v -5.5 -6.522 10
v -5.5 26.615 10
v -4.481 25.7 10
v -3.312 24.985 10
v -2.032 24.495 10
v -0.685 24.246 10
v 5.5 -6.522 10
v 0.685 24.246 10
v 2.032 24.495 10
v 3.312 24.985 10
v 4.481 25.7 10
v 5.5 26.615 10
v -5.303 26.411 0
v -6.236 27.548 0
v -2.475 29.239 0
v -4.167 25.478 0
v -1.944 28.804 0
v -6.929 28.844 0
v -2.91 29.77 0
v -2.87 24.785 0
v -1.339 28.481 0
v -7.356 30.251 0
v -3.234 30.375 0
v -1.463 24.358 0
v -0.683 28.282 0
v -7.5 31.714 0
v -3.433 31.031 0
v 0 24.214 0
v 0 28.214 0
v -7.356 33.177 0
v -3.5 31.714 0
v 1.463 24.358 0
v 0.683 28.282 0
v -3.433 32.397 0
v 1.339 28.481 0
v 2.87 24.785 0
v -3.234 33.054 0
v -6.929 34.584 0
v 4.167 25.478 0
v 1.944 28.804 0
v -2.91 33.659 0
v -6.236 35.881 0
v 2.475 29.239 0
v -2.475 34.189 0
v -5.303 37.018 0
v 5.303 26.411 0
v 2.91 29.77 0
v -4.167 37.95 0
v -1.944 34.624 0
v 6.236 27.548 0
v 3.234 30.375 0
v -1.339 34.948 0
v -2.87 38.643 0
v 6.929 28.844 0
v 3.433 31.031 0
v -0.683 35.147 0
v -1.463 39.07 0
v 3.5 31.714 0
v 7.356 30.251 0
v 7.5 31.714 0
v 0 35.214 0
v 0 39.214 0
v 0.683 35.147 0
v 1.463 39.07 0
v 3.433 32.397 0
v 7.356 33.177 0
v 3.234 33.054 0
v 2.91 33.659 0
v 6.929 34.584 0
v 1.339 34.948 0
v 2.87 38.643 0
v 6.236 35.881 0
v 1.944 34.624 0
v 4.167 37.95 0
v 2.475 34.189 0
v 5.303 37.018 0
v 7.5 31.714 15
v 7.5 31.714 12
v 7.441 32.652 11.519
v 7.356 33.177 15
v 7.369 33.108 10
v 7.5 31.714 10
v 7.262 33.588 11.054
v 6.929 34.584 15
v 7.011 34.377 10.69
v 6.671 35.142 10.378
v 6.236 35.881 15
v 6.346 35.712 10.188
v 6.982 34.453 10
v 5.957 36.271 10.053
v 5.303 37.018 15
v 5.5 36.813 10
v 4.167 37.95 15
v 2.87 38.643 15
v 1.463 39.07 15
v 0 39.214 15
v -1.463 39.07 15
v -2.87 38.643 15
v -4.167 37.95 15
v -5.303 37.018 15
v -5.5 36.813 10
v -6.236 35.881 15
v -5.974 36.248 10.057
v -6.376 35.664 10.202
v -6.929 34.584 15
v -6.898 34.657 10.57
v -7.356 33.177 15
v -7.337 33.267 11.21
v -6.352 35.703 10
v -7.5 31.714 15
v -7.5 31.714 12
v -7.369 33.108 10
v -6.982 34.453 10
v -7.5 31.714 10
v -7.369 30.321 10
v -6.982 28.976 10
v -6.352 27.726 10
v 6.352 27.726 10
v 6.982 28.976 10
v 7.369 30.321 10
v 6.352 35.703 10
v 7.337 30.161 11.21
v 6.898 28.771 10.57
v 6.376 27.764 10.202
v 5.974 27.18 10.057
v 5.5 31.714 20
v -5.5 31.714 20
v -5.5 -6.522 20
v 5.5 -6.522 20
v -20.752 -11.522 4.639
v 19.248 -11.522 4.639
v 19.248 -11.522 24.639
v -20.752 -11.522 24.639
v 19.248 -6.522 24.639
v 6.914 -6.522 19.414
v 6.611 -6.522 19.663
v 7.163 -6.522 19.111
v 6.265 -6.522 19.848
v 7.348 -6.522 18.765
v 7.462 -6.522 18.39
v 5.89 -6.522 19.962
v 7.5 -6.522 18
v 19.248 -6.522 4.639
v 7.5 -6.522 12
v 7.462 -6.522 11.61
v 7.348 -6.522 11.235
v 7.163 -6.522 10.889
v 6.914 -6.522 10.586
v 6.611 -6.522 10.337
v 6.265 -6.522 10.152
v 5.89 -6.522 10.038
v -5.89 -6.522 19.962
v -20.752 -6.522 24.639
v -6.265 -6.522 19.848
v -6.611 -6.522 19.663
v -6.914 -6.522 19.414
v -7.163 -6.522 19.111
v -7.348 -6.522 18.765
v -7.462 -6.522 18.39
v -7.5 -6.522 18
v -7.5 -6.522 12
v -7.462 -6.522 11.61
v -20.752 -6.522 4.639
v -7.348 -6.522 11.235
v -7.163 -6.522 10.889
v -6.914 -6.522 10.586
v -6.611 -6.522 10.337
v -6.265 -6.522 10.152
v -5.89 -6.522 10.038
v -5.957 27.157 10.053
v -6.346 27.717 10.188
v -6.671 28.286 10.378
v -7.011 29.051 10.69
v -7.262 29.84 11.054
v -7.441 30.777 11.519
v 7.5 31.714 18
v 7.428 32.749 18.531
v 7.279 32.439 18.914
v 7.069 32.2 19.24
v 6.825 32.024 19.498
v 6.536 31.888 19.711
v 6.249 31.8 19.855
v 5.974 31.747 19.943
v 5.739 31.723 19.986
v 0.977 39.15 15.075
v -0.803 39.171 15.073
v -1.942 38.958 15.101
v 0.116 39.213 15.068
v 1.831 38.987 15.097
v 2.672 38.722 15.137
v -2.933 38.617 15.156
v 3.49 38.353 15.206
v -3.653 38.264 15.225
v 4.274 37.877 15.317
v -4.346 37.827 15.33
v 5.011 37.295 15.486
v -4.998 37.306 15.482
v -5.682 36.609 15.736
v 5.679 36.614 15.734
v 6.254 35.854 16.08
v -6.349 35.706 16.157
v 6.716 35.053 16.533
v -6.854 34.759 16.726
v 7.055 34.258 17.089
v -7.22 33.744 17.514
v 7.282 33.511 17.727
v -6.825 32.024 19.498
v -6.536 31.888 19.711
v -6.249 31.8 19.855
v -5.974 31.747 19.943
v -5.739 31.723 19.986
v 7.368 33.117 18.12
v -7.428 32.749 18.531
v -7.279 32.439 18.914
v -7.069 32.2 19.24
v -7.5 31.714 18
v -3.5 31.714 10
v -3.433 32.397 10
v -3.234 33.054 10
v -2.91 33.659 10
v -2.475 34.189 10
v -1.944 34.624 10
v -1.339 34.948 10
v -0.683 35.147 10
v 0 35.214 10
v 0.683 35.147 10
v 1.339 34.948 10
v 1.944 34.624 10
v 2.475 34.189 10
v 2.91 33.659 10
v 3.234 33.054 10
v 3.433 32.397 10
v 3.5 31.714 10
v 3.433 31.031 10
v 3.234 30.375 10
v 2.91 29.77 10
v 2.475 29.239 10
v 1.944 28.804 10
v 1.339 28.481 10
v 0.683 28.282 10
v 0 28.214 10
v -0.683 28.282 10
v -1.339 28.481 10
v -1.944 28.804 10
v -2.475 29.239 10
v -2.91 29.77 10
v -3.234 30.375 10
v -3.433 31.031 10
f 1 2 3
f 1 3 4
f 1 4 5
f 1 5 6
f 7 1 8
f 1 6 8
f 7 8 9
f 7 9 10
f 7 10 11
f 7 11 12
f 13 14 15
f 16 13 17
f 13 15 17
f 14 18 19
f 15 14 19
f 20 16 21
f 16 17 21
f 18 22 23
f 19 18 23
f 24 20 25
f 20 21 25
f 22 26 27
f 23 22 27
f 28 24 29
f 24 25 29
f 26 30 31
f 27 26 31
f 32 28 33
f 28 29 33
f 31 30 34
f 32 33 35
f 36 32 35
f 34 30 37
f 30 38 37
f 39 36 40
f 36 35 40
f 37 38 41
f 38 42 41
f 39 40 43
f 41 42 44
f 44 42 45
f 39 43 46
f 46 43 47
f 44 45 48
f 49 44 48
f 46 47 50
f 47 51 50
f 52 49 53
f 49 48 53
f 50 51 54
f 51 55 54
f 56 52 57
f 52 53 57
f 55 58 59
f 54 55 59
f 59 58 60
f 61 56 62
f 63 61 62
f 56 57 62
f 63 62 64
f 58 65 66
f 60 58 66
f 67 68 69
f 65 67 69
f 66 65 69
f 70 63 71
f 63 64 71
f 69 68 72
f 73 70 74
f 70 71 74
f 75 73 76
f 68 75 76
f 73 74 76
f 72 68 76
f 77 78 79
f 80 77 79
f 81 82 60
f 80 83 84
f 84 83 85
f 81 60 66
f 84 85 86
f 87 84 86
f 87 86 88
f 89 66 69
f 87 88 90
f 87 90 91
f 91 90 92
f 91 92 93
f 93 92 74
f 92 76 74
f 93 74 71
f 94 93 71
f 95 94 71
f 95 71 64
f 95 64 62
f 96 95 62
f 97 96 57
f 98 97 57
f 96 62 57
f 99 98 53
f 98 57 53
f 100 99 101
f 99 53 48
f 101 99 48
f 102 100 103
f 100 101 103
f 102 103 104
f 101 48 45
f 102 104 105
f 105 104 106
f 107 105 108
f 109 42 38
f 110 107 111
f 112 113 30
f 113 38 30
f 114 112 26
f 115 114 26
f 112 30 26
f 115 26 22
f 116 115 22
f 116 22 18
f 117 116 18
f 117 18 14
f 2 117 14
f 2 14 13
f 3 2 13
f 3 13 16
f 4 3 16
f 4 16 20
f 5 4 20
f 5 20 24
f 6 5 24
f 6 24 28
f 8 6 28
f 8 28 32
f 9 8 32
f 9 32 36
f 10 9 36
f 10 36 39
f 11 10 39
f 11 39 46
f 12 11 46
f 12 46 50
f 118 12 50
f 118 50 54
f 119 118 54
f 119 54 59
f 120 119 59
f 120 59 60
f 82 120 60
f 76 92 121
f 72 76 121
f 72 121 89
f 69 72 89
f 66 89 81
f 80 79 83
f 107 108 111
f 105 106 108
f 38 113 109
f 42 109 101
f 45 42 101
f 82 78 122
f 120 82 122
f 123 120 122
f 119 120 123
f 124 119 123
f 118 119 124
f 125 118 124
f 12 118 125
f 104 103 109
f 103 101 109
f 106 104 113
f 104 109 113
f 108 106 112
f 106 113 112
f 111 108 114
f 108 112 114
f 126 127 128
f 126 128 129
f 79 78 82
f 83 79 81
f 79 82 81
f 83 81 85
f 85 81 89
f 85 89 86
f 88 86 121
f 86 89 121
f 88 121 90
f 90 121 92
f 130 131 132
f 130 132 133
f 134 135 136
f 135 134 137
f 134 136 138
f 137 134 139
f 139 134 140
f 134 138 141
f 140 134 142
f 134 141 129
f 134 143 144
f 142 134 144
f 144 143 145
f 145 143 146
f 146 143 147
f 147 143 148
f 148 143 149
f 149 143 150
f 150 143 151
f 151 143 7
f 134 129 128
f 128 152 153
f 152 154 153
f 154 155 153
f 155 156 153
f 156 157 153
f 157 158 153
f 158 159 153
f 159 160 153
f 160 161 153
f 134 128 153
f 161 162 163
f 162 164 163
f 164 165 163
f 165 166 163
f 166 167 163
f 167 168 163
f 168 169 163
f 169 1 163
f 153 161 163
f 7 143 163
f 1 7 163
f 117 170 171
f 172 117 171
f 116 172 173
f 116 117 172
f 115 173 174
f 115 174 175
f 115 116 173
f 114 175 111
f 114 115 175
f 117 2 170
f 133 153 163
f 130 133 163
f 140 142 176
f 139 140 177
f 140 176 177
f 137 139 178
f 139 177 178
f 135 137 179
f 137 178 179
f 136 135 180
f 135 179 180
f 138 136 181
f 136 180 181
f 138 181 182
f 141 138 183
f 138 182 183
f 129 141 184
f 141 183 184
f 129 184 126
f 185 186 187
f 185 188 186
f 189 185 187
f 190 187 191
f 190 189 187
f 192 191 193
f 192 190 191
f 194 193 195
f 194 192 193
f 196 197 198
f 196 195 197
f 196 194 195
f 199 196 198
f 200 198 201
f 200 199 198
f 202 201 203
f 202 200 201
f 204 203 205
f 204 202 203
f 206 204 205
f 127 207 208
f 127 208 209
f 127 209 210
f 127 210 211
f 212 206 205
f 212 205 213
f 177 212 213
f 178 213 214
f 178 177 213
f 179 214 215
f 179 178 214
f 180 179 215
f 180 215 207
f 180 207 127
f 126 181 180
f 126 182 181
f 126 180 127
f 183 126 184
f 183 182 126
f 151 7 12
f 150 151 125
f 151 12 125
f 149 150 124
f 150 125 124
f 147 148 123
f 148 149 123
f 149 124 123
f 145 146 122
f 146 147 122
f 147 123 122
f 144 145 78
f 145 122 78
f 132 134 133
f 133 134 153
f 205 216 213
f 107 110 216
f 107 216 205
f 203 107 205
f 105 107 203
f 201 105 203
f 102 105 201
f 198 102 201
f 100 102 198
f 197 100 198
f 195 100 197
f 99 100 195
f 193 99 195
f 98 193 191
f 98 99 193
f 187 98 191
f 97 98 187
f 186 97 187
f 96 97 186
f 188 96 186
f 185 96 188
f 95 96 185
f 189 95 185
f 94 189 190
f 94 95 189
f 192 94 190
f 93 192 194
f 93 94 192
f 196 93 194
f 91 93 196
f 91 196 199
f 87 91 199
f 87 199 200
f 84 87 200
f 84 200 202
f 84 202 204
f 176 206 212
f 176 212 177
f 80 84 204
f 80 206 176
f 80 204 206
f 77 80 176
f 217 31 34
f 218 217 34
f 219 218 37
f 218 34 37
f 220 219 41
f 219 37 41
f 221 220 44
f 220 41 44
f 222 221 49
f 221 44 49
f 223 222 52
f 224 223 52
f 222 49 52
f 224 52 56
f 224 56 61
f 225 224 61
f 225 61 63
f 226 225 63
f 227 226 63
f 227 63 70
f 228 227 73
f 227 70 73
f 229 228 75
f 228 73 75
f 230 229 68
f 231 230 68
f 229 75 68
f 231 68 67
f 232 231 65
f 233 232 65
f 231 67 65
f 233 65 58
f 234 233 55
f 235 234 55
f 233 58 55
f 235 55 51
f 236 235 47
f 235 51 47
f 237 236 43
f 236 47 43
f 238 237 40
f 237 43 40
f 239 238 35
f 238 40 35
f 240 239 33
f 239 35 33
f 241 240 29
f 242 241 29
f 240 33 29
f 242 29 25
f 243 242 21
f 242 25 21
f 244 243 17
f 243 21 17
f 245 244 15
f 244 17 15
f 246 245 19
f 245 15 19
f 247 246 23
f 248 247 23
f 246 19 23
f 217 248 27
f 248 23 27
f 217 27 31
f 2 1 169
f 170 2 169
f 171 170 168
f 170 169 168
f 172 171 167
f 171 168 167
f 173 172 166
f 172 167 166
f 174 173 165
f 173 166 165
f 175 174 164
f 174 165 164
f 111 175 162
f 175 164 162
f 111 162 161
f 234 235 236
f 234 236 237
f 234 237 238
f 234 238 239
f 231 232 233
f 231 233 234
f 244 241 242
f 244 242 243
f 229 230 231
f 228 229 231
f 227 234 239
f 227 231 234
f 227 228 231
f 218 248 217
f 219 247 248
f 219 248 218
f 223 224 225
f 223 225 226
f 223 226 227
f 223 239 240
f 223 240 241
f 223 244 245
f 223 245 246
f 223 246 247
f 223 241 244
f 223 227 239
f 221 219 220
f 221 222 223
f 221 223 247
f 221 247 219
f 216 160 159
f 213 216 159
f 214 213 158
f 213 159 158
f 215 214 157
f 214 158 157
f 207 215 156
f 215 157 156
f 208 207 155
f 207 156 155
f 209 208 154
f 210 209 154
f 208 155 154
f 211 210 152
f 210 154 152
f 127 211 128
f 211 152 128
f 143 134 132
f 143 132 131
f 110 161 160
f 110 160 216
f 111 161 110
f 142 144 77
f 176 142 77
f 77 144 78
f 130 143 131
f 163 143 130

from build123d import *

# Parameters (mm, degrees)
IZIM1_R                          = 7.5
Y_KSEKLIK_EKSTR_ZYON1_DEPTH      = 15
Y_KSEKLIK_EKSTR_ZYON2_DEPTH      = 5
Y_KSEKLIK_EKSTR_ZYON2_DEPTH_BACK = 5
IZIM2_W                          = 15
IZIM2_H                          = 38.236646402
RADYUS1_R                        = 10
RADYUS2_R                        = 2
IZIM3_R                          = 3.5
KES_EKSTR_ZYON1_DEPTH            = 10
IZIM4_W                          = 40
IZIM4_H                          = 20
Y_KSEKLIK_EKSTR_ZYON3_DEPTH      = 5


with BuildPart() as part:
    # Çizim1 → Yükseklik-Ekstrüzyon1 (new body)
    with BuildSketch(Plane.XY):
        with Locations((0, 31.714285714)):
            Circle(IZIM1_R)
    extrude(amount=Y_KSEKLIK_EKSTR_ZYON1_DEPTH)

    # Çizim2 → Yükseklik-Ekstrüzyon2 (add, two sides: drawn at the far end of the back side and taken through both)
    with BuildSketch(Plane.XY.offset(15).offset(-Y_KSEKLIK_EKSTR_ZYON2_DEPTH_BACK)):
        with Locations((0, 12.595962513)):
            Rectangle(IZIM2_W, IZIM2_H)
    extrude(amount=Y_KSEKLIK_EKSTR_ZYON2_DEPTH + Y_KSEKLIK_EKSTR_ZYON2_DEPTH_BACK)

    # Radyus1
    # the kernel refuses this fillet: 10 mm, written as the material it adds along each edge
    with BuildSketch(Plane(origin=(29.150635095, 31.714285714, 15), x_dir=(0, 1, 0), z_dir=(-1, 0, 0))) as radyus1_piece_1_section:
        with BuildLine():
            CenterArc((8.660254038, -10), RADYUS1_R, 90, 60)
            Line((0, -5), (0, 0))
            Line((0, 0), (8.660254038, 0))
        make_face()
    radyus1_piece_1 = extrude(amount=58.301270189, mode=Mode.PRIVATE)
    radyus1_piece_1 = radyus1_piece_1 & Plane(origin=(0, 31.714285714, 15), x_dir=(1, 0, 0), z_dir=(0, 0, -1)) * Cylinder(7.5, 152, mode=Mode.PRIVATE)
    add(radyus1_piece_1)

    # Radyus2
    # the kernel refuses this fillet: 2 mm, written as the material it takes off along each edge
    with BuildSketch(Plane(origin=(-7.5, -11.522360688, 10), x_dir=(0, 0, 1), z_dir=(0, 1, 0))) as radyus2_piece_1_section:
        with BuildLine():
            CenterArc((RADYUS2_R, RADYUS2_R), RADYUS2_R, 180, 90)
            Line((0, RADYUS2_R), (0, 0))
            Line((0, 0), (RADYUS2_R, 0))
        make_face()
    radyus2_piece_1 = extrude(amount=51.736646403, mode=Mode.PRIVATE)
    radyus2_piece_1 = radyus2_piece_1 - Plane(origin=(0, 31.714285714, 10), x_dir=(1, 0, 0), z_dir=(0, 0, -1)) * Cylinder(7.5, 112, mode=Mode.PRIVATE)
    add(radyus2_piece_1, mode=Mode.SUBTRACT)
    with BuildSketch(Plane(origin=(-7.5, -11.522360688, 20), x_dir=(0, 0, -1), z_dir=(0, 1, 0)), Plane(origin=(7.5, 40.214285714, 20), x_dir=(0, 0, -1), z_dir=(0, -1, 0))) as radyus2_piece_2:
        with BuildLine():
            CenterArc((RADYUS2_R, -RADYUS2_R), RADYUS2_R, 90, 90)
            Line((0, -RADYUS2_R), (0, 0))
            Line((0, 0), (RADYUS2_R, 0))
        make_face()
    extrude(amount=51.736646403, mode=Mode.SUBTRACT)
    with BuildSketch(Plane(origin=(7.5, 40.214285714, 10), x_dir=(-1, 0, 0), z_dir=(0, -1, 0))) as radyus2_piece_3_section:
        with BuildLine():
            CenterArc((RADYUS2_R, -RADYUS2_R), RADYUS2_R, 90, 90)
            Line((0, -RADYUS2_R), (0, 0))
            Line((0, 0), (RADYUS2_R, 0))
        make_face()
    radyus2_piece_3 = extrude(amount=51.736646403, mode=Mode.PRIVATE)
    radyus2_piece_3 = radyus2_piece_3 - Plane(origin=(0, 31.714285714, 10), x_dir=(1, 0, 0), z_dir=(0, 0, -1)) * Cylinder(7.5, 112, mode=Mode.PRIVATE)
    add(radyus2_piece_3, mode=Mode.SUBTRACT)

    # Çizim3 → Kes-Ekstrüzyon1 (cut)
    with BuildSketch(Plane(origin=(0, 0, 0), x_dir=(-1, 0, 0), z_dir=(0, 0, -1))):
        with Locations((0, 31.714285714)):
            Circle(IZIM3_R)
    extrude(amount=-KES_EKSTR_ZYON1_DEPTH, mode=Mode.SUBTRACT)

    # Çizim4 → Yükseklik-Ekstrüzyon3 (add)
    with BuildSketch(Plane(origin=(0, -6.522360688, 0), x_dir=(-1, 0, 0), z_dir=(0, -1, 0))):
        with Locations((0.752019729, -14.638510347)):
            Rectangle(IZIM4_W, IZIM4_H)
    extrude(amount=Y_KSEKLIK_EKSTR_ZYON3_DEPTH)


solid = part.part
